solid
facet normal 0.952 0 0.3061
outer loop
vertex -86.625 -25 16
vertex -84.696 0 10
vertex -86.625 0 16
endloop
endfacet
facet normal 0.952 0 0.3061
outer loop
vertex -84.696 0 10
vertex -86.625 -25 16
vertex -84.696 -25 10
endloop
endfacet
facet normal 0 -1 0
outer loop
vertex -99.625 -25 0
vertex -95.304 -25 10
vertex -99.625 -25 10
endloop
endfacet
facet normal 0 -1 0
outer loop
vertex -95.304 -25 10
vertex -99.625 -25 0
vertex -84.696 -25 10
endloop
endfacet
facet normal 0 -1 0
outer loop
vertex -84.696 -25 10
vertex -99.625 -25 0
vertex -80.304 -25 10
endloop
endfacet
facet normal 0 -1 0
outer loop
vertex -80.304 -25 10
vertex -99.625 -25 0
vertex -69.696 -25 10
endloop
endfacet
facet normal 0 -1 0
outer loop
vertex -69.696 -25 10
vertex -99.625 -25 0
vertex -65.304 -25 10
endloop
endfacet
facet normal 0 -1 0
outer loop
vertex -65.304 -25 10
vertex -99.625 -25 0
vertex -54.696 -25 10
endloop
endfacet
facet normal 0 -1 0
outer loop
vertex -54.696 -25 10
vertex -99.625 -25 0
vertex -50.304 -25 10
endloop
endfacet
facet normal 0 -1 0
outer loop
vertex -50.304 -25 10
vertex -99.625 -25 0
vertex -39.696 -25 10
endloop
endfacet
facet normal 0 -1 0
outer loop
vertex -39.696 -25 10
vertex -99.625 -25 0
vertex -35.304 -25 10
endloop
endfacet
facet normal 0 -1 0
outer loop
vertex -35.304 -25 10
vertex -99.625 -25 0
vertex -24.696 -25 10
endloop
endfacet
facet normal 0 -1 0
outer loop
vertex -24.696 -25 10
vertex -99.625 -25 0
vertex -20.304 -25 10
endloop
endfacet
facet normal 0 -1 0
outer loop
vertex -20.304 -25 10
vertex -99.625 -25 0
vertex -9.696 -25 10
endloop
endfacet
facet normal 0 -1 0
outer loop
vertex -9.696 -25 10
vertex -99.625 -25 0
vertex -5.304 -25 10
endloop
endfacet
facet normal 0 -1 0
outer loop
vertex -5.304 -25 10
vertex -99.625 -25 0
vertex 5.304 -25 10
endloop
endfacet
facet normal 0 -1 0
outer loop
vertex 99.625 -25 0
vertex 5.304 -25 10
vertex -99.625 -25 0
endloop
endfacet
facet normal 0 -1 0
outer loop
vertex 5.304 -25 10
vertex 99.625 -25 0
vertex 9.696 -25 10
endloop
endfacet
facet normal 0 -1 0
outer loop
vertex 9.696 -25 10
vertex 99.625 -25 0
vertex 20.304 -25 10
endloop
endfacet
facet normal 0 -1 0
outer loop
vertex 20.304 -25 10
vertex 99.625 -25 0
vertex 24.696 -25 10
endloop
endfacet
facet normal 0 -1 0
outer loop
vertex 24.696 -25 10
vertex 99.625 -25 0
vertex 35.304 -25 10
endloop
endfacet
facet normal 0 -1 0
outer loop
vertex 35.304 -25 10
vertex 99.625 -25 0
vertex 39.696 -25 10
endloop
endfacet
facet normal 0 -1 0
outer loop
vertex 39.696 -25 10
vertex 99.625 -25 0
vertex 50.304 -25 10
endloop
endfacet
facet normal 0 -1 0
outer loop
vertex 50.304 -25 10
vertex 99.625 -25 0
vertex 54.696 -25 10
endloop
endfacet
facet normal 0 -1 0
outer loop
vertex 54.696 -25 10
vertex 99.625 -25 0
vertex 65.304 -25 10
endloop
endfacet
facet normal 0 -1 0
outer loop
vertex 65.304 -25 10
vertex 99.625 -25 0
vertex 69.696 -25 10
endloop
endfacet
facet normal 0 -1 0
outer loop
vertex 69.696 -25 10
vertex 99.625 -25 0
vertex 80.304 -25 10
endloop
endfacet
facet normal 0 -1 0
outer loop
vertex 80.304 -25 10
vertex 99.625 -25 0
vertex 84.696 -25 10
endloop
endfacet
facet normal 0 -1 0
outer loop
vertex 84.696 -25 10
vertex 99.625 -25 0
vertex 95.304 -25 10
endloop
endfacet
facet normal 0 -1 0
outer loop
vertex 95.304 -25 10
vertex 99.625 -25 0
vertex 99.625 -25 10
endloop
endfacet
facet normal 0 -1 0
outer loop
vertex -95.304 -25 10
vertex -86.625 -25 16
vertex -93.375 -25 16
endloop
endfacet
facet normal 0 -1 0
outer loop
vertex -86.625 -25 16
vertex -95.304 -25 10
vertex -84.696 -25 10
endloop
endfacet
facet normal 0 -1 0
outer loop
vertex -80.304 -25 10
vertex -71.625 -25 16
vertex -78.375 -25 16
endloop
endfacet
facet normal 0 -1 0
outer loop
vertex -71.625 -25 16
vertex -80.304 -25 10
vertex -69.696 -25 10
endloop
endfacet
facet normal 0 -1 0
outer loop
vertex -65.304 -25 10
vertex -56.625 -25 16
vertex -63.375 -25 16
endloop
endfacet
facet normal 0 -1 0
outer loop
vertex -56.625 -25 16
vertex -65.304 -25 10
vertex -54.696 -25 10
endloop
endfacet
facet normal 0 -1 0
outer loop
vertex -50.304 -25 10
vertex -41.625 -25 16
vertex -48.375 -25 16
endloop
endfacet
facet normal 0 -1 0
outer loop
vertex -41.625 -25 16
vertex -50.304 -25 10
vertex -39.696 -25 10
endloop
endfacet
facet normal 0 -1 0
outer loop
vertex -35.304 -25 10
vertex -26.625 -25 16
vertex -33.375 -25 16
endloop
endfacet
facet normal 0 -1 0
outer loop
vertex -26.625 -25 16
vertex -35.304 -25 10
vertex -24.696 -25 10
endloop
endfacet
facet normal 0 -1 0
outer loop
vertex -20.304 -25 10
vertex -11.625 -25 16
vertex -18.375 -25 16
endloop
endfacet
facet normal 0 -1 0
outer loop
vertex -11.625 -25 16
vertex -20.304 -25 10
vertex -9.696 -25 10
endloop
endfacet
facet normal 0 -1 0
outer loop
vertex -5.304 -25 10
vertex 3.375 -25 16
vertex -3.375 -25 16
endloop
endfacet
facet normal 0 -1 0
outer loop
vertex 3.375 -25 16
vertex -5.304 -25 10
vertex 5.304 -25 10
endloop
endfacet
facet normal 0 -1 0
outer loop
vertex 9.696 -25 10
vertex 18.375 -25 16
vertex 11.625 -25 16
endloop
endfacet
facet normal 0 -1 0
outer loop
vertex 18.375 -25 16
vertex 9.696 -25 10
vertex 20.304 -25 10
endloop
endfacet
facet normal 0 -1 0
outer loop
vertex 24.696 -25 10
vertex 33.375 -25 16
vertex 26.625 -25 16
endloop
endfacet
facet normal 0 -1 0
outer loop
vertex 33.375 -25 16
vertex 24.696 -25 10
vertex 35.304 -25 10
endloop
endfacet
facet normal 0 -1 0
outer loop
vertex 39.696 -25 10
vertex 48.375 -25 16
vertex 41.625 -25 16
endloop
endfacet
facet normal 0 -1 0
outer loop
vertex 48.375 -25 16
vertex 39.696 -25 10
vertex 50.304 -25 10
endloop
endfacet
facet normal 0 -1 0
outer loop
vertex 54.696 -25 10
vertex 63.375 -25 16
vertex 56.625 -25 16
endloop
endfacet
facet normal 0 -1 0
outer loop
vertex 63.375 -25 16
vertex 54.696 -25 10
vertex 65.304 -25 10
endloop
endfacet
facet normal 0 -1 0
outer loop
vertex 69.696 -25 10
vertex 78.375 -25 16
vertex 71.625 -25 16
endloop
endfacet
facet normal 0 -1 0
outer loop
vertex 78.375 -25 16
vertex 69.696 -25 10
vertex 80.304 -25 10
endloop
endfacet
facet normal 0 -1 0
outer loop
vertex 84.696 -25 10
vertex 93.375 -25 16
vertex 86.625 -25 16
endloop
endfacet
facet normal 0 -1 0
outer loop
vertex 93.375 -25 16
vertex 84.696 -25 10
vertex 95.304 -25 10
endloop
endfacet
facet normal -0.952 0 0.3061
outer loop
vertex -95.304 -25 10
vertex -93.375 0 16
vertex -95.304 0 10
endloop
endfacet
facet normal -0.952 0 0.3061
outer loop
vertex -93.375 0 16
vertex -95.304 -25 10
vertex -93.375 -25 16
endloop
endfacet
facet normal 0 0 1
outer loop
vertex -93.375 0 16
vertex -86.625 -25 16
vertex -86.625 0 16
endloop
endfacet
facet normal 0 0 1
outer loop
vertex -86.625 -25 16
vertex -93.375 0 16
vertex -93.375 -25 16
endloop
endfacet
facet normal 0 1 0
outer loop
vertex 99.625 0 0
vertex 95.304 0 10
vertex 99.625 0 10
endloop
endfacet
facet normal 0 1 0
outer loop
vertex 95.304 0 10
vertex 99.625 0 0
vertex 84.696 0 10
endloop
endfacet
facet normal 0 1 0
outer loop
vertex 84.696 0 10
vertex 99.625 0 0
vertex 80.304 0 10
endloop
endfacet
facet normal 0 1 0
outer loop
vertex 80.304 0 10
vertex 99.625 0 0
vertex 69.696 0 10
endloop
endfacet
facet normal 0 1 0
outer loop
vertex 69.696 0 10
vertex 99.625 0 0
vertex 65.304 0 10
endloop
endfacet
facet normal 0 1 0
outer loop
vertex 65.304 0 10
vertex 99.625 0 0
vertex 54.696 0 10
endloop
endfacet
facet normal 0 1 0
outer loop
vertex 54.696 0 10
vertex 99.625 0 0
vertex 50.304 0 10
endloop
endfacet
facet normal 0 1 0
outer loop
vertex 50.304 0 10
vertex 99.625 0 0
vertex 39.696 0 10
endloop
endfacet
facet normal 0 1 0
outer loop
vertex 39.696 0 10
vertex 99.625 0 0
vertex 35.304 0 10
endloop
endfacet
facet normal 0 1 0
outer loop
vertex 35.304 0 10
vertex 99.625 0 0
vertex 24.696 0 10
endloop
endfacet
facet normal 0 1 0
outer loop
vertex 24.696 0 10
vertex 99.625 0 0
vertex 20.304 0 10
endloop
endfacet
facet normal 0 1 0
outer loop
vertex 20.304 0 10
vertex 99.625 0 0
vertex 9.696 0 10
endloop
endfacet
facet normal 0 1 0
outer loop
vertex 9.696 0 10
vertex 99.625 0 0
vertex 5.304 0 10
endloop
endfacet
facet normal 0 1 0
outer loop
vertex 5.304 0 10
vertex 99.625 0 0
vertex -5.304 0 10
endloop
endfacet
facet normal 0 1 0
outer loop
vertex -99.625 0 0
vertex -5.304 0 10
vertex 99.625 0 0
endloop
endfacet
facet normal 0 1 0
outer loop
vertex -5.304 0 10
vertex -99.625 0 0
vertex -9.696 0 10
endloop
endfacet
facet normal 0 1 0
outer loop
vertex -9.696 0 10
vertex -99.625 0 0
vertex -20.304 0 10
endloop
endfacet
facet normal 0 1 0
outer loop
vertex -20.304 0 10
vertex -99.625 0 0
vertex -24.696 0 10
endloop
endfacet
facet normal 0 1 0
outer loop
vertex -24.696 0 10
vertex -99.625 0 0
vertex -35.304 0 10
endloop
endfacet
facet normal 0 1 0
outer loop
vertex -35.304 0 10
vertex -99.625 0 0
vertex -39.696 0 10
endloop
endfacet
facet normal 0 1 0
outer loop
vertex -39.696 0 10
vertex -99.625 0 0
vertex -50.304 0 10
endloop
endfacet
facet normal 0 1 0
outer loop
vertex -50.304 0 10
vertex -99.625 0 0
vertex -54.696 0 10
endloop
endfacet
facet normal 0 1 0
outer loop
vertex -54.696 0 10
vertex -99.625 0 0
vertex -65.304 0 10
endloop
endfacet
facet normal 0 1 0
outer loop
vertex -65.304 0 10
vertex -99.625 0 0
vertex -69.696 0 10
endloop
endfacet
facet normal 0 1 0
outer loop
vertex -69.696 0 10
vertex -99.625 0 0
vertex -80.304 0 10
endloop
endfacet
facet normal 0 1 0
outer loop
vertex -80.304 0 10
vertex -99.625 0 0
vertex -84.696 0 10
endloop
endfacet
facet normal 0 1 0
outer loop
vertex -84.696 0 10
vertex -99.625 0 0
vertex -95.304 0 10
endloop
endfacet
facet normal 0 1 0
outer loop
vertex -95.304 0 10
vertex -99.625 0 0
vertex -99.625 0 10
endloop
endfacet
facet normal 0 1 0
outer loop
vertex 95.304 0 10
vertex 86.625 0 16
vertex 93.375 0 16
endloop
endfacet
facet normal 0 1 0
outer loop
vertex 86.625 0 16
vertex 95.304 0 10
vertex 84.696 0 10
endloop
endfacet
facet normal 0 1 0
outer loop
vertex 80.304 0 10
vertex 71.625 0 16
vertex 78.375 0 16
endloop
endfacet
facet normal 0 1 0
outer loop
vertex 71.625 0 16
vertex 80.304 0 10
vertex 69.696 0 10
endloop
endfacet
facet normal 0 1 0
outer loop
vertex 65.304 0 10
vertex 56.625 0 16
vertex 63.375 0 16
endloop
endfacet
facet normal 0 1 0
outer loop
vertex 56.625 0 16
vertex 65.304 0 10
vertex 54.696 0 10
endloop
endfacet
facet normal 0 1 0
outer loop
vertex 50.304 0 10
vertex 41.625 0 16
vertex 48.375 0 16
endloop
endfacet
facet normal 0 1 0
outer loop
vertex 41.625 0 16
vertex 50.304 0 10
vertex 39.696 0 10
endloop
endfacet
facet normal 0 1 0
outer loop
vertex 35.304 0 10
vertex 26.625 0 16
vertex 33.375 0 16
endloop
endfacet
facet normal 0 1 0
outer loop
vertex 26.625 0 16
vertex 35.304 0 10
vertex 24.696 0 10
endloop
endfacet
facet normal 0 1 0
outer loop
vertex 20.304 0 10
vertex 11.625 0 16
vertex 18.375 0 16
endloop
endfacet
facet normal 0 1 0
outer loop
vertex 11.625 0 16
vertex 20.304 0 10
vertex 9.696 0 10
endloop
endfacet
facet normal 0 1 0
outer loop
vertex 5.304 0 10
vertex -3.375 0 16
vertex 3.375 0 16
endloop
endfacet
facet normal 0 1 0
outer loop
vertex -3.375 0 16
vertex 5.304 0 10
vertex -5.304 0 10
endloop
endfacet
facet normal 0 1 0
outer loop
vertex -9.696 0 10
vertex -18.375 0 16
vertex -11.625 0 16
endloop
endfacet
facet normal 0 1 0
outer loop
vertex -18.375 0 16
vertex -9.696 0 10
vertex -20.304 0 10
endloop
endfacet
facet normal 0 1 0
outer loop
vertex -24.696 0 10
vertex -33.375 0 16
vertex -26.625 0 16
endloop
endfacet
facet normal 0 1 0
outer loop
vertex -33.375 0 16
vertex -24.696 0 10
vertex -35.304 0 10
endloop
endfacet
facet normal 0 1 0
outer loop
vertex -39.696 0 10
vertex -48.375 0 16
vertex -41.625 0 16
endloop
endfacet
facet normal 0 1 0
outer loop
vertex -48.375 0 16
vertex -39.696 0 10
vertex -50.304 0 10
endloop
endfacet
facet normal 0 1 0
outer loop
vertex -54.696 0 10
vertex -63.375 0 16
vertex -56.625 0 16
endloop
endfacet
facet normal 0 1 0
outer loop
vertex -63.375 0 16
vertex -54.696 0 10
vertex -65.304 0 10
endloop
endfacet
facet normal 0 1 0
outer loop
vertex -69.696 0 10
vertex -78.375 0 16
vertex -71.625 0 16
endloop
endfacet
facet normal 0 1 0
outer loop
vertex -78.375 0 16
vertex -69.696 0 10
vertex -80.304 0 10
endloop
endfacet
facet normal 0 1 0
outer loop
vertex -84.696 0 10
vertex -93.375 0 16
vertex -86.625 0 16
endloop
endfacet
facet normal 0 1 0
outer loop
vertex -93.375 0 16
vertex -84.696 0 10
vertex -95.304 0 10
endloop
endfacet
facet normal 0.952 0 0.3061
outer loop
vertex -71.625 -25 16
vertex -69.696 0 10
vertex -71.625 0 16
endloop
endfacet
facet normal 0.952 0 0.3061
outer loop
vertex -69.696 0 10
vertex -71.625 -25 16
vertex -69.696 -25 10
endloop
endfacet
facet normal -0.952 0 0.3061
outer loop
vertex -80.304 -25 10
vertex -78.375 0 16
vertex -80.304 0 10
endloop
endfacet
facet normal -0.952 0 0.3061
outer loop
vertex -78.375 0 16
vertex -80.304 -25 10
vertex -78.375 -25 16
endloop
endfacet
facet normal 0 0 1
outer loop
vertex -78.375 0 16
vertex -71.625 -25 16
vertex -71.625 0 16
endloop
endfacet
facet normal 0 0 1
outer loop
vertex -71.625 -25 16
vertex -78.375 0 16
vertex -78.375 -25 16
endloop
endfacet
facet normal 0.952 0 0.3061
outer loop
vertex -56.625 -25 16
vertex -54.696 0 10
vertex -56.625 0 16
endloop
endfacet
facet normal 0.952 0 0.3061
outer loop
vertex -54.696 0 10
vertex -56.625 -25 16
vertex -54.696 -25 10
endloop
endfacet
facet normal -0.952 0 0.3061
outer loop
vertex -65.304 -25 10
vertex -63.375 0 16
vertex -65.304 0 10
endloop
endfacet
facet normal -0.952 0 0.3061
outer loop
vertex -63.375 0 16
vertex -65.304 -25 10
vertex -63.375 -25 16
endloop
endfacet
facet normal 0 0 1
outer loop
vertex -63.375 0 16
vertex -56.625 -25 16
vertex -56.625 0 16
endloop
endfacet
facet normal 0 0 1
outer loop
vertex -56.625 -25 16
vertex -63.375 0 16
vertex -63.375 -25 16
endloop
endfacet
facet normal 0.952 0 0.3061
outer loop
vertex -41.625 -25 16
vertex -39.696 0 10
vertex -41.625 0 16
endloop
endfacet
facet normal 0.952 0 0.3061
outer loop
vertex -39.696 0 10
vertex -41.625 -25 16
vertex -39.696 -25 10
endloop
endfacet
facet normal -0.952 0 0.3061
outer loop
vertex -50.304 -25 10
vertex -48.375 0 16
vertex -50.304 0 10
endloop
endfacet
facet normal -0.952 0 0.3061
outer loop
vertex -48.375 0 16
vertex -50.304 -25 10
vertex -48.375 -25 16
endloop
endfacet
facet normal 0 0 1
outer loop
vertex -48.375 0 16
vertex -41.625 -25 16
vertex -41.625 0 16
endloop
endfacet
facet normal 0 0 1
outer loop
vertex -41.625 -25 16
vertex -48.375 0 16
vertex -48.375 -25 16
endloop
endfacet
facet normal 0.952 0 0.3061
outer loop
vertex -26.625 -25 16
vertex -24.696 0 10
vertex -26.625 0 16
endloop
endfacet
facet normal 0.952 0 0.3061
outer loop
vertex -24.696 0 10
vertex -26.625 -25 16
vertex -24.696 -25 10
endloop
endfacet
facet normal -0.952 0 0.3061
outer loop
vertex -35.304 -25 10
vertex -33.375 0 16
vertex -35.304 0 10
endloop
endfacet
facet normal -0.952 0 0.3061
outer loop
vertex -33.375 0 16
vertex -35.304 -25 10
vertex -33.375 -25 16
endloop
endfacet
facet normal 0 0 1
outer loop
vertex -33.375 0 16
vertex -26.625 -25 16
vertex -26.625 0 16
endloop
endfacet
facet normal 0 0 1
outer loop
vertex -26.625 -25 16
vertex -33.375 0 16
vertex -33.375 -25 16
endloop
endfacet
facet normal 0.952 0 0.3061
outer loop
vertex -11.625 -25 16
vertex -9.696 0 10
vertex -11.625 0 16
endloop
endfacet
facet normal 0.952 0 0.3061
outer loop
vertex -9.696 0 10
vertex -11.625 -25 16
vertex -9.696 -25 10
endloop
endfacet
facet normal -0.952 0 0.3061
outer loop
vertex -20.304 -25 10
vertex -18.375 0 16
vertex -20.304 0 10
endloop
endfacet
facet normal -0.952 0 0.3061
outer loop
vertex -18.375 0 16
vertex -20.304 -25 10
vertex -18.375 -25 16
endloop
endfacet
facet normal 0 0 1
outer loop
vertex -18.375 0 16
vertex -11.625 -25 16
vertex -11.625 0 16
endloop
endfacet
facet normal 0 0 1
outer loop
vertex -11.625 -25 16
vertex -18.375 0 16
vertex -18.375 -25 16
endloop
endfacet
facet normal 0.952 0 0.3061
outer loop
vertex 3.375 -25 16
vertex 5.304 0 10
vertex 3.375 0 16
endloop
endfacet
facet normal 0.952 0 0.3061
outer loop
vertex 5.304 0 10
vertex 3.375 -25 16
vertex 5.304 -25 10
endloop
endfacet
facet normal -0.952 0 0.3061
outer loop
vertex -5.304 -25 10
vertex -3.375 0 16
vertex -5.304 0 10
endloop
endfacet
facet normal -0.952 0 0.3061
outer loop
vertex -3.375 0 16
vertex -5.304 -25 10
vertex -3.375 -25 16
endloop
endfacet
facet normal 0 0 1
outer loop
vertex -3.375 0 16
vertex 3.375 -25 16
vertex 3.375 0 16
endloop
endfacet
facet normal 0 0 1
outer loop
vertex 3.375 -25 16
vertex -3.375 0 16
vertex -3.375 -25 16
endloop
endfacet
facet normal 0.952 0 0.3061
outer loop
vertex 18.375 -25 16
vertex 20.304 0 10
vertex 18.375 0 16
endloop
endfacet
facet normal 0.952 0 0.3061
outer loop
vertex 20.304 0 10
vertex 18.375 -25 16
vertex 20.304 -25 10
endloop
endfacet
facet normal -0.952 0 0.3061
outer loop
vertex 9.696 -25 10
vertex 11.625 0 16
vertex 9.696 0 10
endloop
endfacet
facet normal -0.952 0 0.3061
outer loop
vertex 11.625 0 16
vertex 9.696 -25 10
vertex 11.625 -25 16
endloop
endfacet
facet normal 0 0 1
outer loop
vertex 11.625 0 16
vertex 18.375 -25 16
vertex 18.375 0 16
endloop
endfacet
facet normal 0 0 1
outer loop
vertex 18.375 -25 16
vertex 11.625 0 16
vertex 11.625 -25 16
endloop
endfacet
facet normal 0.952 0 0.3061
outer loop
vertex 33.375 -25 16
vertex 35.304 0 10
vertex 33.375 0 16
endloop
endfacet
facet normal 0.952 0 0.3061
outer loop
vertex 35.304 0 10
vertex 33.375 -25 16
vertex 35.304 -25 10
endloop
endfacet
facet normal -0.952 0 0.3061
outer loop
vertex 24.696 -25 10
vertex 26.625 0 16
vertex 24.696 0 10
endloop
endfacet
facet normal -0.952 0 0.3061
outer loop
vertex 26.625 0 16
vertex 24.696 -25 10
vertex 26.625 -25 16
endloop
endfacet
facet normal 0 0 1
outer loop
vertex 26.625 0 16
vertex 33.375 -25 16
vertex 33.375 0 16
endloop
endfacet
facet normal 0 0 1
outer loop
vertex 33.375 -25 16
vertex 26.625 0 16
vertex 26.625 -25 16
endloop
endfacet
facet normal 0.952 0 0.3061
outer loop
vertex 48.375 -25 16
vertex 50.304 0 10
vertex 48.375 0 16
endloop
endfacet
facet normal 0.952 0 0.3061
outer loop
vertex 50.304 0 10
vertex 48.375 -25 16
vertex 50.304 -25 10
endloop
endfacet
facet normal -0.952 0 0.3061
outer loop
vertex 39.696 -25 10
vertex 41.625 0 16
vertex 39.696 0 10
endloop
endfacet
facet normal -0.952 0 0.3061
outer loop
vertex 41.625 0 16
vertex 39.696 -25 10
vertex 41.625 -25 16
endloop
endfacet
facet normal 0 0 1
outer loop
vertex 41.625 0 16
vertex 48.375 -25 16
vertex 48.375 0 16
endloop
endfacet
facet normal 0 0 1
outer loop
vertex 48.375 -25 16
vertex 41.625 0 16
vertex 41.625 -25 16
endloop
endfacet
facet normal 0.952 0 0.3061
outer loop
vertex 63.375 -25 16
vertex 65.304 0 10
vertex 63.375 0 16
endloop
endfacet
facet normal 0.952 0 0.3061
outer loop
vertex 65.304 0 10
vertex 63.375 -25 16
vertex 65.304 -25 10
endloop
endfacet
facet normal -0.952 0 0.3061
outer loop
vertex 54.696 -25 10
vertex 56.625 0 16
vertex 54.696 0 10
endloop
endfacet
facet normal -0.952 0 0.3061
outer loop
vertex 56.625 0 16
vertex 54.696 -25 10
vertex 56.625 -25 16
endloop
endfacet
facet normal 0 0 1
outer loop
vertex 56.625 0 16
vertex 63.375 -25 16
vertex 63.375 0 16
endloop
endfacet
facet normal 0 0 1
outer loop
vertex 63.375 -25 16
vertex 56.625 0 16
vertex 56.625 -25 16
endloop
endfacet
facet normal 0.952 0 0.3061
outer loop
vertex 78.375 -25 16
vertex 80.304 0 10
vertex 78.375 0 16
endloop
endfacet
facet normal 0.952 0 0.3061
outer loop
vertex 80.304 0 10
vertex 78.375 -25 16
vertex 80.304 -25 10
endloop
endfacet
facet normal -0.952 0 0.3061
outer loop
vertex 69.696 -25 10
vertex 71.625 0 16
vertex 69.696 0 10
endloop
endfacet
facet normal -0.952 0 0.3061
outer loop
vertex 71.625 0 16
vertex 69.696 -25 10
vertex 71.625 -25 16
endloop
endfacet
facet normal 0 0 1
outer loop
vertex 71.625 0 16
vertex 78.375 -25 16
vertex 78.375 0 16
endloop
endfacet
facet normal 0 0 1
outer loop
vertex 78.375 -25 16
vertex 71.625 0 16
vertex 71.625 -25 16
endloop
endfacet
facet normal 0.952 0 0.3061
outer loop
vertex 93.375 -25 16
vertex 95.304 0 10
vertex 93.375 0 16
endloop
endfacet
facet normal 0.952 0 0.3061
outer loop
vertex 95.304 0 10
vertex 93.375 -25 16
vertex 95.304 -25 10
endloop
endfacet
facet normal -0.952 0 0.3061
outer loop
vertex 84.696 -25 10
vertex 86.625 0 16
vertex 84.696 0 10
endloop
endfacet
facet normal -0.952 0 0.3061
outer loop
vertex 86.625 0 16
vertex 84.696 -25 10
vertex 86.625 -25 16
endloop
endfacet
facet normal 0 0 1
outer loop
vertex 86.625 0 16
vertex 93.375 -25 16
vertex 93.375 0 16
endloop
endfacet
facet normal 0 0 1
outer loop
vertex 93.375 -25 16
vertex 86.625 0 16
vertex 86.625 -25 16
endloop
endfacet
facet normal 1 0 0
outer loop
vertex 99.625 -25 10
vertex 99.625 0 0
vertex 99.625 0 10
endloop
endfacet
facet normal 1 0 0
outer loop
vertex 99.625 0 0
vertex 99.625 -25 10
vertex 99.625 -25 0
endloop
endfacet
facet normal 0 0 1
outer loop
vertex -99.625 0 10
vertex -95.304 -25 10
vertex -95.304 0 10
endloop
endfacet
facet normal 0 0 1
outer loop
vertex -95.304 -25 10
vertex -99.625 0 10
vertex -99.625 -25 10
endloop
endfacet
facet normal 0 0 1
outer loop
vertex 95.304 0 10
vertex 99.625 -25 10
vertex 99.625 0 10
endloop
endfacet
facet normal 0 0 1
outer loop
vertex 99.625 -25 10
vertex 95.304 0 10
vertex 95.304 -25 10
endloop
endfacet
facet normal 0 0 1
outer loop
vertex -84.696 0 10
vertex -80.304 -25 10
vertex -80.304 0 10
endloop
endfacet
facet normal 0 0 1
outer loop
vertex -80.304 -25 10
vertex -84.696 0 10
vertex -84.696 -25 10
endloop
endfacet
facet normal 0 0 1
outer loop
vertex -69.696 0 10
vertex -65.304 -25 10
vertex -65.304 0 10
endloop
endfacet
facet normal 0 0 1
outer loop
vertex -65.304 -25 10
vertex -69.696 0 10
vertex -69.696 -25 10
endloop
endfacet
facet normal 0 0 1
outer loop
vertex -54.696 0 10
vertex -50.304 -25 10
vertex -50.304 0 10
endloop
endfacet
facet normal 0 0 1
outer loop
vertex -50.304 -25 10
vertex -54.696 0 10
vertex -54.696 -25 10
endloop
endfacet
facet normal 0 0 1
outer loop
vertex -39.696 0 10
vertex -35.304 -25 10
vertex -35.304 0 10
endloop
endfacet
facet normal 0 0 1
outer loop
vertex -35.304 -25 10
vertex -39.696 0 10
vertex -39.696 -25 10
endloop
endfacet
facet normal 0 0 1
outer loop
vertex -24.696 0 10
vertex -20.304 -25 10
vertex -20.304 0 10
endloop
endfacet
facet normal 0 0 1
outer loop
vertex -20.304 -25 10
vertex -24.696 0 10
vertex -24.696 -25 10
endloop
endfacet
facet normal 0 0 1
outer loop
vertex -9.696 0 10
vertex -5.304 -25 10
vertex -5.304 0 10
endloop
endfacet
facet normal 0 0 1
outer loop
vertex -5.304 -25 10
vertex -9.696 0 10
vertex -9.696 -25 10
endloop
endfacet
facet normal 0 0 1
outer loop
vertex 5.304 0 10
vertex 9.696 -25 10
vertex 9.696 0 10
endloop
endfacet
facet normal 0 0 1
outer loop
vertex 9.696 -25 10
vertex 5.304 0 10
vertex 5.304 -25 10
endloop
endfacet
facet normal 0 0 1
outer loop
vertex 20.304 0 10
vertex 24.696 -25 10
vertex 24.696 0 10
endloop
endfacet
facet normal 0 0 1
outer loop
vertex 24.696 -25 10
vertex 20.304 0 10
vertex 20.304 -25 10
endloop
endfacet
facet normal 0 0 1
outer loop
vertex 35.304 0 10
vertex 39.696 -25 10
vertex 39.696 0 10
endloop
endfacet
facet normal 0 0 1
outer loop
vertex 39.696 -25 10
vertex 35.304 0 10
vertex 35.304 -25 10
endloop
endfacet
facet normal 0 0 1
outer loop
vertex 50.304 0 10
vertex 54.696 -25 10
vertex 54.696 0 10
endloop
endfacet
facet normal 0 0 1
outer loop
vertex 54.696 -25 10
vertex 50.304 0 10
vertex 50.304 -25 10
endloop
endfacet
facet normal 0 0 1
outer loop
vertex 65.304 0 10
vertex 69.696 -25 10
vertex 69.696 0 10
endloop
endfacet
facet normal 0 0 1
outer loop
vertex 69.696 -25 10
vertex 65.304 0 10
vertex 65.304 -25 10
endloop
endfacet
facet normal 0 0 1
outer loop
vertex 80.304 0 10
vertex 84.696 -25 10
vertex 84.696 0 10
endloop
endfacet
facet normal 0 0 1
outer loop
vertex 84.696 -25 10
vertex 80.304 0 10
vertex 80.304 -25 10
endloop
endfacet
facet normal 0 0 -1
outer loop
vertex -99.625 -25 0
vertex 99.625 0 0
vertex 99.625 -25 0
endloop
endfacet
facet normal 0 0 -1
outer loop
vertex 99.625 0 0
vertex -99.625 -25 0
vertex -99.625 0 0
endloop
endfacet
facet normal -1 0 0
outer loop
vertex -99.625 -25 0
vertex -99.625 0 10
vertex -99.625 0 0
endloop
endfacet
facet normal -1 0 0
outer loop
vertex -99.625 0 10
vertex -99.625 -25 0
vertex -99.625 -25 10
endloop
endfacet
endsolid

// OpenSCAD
$fn = 32;

// ----------------------------------------------------------------------
// Toothed rack, 13 teeth
// 15 mm pitch, 6 mm teeth
// ----------------------------------------------------------------------

// --- parameters (mm) ---
bar_w = 25;      // bar width (Y)
bar_h = 10;      // bar height (Z)
teeth = 13;      // number of teeth
pitch = 15;      // tooth pitch
tooth_h = 6;     // tooth height above the bar
root_w = 11.25;  // tooth width at the root
crest_w = 6.75;  // tooth width at the crest

// --- derived feature positions (mm) ---
span = (teeth - 1) * pitch;  // = 180   distance between the outer teeth
bar_l = span + root_w + 8;   // = 199.25   bar length: teeth plus 4 mm at each end
tooth_x = -span / 2;         // = -90   X of the first tooth
height = bar_h + tooth_h;    // = 16   overall height
feature_centers = [
  [tooth_x + 0 * pitch, -bar_w / 2],
  [tooth_x + 1 * pitch, -bar_w / 2],
  [tooth_x + 2 * pitch, -bar_w / 2],
  [tooth_x + 3 * pitch, -bar_w / 2],
  [tooth_x + 4 * pitch, -bar_w / 2],
  [tooth_x + 5 * pitch, -bar_w / 2],
  [tooth_x + 6 * pitch, -bar_w / 2],
  [tooth_x + 7 * pitch, -bar_w / 2],
  [tooth_x + 8 * pitch, -bar_w / 2],
  [tooth_x + 9 * pitch, -bar_w / 2],
  [tooth_x + 10 * pitch, -bar_w / 2],
  [tooth_x + 11 * pitch, -bar_w / 2],
  [tooth_x + 12 * pitch, -bar_w / 2]
];   // tooth centre line, drives the tooth loop

// bar with a rack of teeth, one extruded trapezoium per centre
module rack_tooth() {
  linear_extrude(height = bar_w)
    polygon(points = [
      [0, 0],
      [root_w, 0],
      [root_w / 2 + crest_w / 2, tooth_h + 1],
      [root_w / 2 - crest_w / 2, tooth_h + 1]
    ]);
}

union() {
  translate([-bar_l / 2, -bar_w, 0]) cube([bar_l, bar_w, bar_h]);
  for (centre = feature_centers)
    translate([centre[0] - root_w / 2, 0, bar_h - 1]) rotate([90, 0, 0]) rack_tooth();
}
